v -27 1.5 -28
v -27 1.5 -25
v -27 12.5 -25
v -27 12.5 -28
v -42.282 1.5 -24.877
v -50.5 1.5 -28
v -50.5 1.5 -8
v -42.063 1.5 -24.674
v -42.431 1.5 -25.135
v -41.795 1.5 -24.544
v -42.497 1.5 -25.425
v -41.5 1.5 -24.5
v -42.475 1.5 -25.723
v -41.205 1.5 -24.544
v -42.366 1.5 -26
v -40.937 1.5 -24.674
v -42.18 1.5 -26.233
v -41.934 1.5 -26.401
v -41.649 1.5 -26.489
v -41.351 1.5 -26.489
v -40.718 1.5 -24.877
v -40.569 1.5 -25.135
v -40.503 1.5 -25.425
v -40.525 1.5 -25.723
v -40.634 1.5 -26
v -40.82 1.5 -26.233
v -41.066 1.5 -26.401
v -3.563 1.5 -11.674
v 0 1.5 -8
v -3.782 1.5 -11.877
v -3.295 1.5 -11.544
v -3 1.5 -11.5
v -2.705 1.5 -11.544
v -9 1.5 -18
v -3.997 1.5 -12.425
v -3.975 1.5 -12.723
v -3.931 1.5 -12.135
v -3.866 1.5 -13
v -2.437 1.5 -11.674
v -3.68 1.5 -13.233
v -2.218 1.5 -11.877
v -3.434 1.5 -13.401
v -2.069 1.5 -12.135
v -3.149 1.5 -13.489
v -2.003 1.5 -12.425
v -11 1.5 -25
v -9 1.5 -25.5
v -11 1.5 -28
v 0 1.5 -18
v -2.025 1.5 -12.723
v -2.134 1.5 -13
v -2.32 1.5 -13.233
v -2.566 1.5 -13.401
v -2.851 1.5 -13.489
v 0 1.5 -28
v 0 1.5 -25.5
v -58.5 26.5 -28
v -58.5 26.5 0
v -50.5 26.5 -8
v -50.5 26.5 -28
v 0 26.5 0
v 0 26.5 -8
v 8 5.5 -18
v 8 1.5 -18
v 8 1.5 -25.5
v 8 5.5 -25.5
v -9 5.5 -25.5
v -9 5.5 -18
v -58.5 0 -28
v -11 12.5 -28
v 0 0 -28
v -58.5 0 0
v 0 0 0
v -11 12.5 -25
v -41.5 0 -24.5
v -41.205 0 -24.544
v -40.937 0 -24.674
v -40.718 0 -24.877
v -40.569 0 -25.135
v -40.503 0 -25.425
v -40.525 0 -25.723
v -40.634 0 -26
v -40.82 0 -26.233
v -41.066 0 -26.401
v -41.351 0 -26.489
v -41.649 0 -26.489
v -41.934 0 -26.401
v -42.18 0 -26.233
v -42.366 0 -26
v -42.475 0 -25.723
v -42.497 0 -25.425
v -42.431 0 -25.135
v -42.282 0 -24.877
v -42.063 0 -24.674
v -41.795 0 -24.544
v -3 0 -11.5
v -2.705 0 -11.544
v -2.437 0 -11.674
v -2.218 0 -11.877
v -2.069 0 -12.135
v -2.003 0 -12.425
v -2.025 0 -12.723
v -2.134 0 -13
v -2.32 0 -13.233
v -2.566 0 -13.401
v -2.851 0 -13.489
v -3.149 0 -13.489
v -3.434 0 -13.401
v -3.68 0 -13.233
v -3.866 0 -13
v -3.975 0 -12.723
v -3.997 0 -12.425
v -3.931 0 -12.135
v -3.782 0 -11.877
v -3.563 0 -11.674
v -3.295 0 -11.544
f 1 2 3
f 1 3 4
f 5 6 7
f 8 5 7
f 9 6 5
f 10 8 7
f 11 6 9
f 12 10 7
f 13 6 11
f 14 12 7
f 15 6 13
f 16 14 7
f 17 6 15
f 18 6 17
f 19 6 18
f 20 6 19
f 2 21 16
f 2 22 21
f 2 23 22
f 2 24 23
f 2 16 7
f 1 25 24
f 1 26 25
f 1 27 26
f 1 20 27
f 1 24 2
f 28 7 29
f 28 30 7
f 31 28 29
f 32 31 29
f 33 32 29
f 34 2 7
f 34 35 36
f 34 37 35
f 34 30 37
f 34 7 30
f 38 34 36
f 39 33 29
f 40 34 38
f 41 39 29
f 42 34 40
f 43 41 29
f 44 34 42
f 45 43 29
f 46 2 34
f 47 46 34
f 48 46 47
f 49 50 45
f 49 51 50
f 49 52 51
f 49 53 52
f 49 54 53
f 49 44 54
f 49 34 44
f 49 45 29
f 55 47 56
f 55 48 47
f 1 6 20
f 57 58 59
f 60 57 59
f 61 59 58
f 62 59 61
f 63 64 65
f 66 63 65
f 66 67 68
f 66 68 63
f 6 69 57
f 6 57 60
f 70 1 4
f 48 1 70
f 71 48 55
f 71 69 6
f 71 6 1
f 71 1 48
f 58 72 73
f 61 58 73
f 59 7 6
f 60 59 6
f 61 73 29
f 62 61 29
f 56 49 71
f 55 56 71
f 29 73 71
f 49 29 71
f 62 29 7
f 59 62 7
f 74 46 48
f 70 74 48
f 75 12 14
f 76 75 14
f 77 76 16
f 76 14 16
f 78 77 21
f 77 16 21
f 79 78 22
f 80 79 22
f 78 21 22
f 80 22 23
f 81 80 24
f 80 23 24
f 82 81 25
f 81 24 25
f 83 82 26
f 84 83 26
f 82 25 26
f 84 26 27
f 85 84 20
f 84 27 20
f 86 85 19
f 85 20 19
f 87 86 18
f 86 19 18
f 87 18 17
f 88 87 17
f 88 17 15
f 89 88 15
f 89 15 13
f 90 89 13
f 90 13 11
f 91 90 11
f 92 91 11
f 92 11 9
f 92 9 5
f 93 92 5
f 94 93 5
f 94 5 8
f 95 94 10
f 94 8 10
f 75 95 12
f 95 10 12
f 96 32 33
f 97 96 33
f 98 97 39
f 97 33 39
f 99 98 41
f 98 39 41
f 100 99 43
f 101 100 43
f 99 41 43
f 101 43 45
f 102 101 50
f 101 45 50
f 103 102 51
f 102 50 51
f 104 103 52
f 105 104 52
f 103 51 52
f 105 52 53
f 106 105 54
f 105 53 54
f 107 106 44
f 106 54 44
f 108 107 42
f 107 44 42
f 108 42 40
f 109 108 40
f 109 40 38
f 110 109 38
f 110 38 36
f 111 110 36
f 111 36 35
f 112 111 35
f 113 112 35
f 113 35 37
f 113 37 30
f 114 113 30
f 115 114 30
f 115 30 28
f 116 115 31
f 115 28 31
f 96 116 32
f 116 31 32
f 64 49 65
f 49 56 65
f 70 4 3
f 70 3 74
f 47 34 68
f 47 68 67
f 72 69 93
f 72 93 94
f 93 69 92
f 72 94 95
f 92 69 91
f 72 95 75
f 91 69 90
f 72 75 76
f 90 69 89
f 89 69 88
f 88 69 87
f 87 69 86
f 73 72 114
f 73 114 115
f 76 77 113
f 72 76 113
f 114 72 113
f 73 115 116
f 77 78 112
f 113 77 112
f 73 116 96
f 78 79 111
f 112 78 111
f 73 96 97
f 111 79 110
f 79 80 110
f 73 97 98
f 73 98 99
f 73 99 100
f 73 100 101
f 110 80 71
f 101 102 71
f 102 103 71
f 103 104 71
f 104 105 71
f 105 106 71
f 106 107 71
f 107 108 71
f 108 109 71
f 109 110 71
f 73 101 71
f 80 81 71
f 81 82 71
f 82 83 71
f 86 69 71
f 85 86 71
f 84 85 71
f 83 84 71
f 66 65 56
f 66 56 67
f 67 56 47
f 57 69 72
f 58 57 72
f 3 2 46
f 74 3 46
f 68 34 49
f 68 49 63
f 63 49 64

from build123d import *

# Parameters (mm, degrees)
SKETCH_1_W          = 58.5
SKETCH_1_H          = 28
EXTRUDE_1_DEPTH     = 1.5
SKETCH_2_R          = 1
CUT_EXTRUDE_1_DEPTH = 1.5
EXTRUDE_2_DEPTH     = 25
SKETCH_4_W          = 16
SKETCH_4_H          = 3
EXTRUDE_3_DEPTH     = 11
SKETCH_5_W          = 8
SKETCH_5_H          = 7.5
SKETCH_5_W_2        = 9
EXTRUDE_4_DEPTH     = 4


with BuildPart() as part:
    # Эскиз1 → Бобышка-Вытянуть1 (new body)
    with BuildSketch(Plane(origin=(0, 0, 0), x_dir=(1, 0, 0), z_dir=(0, 1, 0))):
        with Locations((-29.25, 14)):
            Rectangle(SKETCH_1_W, SKETCH_1_H)
    extrude(amount=EXTRUDE_1_DEPTH)

    # Эскиз2 → Вырез-Вытянуть1 (cut)
    with BuildSketch(Plane(origin=(0, 1.5, 0), x_dir=(1, 0, 0), z_dir=(0, 1, 0))):
        with Locations(Location((-3, 12.5, 0), (0, 0, 270))):
            Circle(SKETCH_2_R)
        with Locations(Location((-41.5, 25.5, 0), (0, 0, 270))):
            Circle(SKETCH_2_R)
    extrude(amount=-CUT_EXTRUDE_1_DEPTH, mode=Mode.SUBTRACT)

    # Эскиз3 → Бобышка-Вытянуть2 (add)
    with BuildSketch(Plane(origin=(0, 1.5, 0), x_dir=(1, 0, 0), z_dir=(0, 1, 0))):
        Polygon((0, 0), (0, 8), (-50.5, 8), (-50.5, 28), (-58.5, 28), (-58.5, 0), align=None)
    extrude(amount=EXTRUDE_2_DEPTH)

    # Эскиз4 → Бобышка-Вытянуть3 (add)
    with BuildSketch(Plane(origin=(0, 1.5, 0), x_dir=(1, 0, 0), z_dir=(0, 1, 0))):
        with Locations((-19, 26.5)):
            Rectangle(SKETCH_4_W, SKETCH_4_H)
    extrude(amount=EXTRUDE_3_DEPTH)

    # Эскиз5 → Бобышка-Вытянуть4 (add)
    with BuildSketch(Plane(origin=(0, 1.5, 0), x_dir=(1, 0, 0), z_dir=(0, 1, 0))):
        with Locations((4, 21.75)):
            Rectangle(SKETCH_5_W, SKETCH_5_H)
        with Locations((-4.5, 21.75)):
            Rectangle(SKETCH_5_W_2, SKETCH_5_H)
    extrude(amount=EXTRUDE_4_DEPTH)


solid = part.part
